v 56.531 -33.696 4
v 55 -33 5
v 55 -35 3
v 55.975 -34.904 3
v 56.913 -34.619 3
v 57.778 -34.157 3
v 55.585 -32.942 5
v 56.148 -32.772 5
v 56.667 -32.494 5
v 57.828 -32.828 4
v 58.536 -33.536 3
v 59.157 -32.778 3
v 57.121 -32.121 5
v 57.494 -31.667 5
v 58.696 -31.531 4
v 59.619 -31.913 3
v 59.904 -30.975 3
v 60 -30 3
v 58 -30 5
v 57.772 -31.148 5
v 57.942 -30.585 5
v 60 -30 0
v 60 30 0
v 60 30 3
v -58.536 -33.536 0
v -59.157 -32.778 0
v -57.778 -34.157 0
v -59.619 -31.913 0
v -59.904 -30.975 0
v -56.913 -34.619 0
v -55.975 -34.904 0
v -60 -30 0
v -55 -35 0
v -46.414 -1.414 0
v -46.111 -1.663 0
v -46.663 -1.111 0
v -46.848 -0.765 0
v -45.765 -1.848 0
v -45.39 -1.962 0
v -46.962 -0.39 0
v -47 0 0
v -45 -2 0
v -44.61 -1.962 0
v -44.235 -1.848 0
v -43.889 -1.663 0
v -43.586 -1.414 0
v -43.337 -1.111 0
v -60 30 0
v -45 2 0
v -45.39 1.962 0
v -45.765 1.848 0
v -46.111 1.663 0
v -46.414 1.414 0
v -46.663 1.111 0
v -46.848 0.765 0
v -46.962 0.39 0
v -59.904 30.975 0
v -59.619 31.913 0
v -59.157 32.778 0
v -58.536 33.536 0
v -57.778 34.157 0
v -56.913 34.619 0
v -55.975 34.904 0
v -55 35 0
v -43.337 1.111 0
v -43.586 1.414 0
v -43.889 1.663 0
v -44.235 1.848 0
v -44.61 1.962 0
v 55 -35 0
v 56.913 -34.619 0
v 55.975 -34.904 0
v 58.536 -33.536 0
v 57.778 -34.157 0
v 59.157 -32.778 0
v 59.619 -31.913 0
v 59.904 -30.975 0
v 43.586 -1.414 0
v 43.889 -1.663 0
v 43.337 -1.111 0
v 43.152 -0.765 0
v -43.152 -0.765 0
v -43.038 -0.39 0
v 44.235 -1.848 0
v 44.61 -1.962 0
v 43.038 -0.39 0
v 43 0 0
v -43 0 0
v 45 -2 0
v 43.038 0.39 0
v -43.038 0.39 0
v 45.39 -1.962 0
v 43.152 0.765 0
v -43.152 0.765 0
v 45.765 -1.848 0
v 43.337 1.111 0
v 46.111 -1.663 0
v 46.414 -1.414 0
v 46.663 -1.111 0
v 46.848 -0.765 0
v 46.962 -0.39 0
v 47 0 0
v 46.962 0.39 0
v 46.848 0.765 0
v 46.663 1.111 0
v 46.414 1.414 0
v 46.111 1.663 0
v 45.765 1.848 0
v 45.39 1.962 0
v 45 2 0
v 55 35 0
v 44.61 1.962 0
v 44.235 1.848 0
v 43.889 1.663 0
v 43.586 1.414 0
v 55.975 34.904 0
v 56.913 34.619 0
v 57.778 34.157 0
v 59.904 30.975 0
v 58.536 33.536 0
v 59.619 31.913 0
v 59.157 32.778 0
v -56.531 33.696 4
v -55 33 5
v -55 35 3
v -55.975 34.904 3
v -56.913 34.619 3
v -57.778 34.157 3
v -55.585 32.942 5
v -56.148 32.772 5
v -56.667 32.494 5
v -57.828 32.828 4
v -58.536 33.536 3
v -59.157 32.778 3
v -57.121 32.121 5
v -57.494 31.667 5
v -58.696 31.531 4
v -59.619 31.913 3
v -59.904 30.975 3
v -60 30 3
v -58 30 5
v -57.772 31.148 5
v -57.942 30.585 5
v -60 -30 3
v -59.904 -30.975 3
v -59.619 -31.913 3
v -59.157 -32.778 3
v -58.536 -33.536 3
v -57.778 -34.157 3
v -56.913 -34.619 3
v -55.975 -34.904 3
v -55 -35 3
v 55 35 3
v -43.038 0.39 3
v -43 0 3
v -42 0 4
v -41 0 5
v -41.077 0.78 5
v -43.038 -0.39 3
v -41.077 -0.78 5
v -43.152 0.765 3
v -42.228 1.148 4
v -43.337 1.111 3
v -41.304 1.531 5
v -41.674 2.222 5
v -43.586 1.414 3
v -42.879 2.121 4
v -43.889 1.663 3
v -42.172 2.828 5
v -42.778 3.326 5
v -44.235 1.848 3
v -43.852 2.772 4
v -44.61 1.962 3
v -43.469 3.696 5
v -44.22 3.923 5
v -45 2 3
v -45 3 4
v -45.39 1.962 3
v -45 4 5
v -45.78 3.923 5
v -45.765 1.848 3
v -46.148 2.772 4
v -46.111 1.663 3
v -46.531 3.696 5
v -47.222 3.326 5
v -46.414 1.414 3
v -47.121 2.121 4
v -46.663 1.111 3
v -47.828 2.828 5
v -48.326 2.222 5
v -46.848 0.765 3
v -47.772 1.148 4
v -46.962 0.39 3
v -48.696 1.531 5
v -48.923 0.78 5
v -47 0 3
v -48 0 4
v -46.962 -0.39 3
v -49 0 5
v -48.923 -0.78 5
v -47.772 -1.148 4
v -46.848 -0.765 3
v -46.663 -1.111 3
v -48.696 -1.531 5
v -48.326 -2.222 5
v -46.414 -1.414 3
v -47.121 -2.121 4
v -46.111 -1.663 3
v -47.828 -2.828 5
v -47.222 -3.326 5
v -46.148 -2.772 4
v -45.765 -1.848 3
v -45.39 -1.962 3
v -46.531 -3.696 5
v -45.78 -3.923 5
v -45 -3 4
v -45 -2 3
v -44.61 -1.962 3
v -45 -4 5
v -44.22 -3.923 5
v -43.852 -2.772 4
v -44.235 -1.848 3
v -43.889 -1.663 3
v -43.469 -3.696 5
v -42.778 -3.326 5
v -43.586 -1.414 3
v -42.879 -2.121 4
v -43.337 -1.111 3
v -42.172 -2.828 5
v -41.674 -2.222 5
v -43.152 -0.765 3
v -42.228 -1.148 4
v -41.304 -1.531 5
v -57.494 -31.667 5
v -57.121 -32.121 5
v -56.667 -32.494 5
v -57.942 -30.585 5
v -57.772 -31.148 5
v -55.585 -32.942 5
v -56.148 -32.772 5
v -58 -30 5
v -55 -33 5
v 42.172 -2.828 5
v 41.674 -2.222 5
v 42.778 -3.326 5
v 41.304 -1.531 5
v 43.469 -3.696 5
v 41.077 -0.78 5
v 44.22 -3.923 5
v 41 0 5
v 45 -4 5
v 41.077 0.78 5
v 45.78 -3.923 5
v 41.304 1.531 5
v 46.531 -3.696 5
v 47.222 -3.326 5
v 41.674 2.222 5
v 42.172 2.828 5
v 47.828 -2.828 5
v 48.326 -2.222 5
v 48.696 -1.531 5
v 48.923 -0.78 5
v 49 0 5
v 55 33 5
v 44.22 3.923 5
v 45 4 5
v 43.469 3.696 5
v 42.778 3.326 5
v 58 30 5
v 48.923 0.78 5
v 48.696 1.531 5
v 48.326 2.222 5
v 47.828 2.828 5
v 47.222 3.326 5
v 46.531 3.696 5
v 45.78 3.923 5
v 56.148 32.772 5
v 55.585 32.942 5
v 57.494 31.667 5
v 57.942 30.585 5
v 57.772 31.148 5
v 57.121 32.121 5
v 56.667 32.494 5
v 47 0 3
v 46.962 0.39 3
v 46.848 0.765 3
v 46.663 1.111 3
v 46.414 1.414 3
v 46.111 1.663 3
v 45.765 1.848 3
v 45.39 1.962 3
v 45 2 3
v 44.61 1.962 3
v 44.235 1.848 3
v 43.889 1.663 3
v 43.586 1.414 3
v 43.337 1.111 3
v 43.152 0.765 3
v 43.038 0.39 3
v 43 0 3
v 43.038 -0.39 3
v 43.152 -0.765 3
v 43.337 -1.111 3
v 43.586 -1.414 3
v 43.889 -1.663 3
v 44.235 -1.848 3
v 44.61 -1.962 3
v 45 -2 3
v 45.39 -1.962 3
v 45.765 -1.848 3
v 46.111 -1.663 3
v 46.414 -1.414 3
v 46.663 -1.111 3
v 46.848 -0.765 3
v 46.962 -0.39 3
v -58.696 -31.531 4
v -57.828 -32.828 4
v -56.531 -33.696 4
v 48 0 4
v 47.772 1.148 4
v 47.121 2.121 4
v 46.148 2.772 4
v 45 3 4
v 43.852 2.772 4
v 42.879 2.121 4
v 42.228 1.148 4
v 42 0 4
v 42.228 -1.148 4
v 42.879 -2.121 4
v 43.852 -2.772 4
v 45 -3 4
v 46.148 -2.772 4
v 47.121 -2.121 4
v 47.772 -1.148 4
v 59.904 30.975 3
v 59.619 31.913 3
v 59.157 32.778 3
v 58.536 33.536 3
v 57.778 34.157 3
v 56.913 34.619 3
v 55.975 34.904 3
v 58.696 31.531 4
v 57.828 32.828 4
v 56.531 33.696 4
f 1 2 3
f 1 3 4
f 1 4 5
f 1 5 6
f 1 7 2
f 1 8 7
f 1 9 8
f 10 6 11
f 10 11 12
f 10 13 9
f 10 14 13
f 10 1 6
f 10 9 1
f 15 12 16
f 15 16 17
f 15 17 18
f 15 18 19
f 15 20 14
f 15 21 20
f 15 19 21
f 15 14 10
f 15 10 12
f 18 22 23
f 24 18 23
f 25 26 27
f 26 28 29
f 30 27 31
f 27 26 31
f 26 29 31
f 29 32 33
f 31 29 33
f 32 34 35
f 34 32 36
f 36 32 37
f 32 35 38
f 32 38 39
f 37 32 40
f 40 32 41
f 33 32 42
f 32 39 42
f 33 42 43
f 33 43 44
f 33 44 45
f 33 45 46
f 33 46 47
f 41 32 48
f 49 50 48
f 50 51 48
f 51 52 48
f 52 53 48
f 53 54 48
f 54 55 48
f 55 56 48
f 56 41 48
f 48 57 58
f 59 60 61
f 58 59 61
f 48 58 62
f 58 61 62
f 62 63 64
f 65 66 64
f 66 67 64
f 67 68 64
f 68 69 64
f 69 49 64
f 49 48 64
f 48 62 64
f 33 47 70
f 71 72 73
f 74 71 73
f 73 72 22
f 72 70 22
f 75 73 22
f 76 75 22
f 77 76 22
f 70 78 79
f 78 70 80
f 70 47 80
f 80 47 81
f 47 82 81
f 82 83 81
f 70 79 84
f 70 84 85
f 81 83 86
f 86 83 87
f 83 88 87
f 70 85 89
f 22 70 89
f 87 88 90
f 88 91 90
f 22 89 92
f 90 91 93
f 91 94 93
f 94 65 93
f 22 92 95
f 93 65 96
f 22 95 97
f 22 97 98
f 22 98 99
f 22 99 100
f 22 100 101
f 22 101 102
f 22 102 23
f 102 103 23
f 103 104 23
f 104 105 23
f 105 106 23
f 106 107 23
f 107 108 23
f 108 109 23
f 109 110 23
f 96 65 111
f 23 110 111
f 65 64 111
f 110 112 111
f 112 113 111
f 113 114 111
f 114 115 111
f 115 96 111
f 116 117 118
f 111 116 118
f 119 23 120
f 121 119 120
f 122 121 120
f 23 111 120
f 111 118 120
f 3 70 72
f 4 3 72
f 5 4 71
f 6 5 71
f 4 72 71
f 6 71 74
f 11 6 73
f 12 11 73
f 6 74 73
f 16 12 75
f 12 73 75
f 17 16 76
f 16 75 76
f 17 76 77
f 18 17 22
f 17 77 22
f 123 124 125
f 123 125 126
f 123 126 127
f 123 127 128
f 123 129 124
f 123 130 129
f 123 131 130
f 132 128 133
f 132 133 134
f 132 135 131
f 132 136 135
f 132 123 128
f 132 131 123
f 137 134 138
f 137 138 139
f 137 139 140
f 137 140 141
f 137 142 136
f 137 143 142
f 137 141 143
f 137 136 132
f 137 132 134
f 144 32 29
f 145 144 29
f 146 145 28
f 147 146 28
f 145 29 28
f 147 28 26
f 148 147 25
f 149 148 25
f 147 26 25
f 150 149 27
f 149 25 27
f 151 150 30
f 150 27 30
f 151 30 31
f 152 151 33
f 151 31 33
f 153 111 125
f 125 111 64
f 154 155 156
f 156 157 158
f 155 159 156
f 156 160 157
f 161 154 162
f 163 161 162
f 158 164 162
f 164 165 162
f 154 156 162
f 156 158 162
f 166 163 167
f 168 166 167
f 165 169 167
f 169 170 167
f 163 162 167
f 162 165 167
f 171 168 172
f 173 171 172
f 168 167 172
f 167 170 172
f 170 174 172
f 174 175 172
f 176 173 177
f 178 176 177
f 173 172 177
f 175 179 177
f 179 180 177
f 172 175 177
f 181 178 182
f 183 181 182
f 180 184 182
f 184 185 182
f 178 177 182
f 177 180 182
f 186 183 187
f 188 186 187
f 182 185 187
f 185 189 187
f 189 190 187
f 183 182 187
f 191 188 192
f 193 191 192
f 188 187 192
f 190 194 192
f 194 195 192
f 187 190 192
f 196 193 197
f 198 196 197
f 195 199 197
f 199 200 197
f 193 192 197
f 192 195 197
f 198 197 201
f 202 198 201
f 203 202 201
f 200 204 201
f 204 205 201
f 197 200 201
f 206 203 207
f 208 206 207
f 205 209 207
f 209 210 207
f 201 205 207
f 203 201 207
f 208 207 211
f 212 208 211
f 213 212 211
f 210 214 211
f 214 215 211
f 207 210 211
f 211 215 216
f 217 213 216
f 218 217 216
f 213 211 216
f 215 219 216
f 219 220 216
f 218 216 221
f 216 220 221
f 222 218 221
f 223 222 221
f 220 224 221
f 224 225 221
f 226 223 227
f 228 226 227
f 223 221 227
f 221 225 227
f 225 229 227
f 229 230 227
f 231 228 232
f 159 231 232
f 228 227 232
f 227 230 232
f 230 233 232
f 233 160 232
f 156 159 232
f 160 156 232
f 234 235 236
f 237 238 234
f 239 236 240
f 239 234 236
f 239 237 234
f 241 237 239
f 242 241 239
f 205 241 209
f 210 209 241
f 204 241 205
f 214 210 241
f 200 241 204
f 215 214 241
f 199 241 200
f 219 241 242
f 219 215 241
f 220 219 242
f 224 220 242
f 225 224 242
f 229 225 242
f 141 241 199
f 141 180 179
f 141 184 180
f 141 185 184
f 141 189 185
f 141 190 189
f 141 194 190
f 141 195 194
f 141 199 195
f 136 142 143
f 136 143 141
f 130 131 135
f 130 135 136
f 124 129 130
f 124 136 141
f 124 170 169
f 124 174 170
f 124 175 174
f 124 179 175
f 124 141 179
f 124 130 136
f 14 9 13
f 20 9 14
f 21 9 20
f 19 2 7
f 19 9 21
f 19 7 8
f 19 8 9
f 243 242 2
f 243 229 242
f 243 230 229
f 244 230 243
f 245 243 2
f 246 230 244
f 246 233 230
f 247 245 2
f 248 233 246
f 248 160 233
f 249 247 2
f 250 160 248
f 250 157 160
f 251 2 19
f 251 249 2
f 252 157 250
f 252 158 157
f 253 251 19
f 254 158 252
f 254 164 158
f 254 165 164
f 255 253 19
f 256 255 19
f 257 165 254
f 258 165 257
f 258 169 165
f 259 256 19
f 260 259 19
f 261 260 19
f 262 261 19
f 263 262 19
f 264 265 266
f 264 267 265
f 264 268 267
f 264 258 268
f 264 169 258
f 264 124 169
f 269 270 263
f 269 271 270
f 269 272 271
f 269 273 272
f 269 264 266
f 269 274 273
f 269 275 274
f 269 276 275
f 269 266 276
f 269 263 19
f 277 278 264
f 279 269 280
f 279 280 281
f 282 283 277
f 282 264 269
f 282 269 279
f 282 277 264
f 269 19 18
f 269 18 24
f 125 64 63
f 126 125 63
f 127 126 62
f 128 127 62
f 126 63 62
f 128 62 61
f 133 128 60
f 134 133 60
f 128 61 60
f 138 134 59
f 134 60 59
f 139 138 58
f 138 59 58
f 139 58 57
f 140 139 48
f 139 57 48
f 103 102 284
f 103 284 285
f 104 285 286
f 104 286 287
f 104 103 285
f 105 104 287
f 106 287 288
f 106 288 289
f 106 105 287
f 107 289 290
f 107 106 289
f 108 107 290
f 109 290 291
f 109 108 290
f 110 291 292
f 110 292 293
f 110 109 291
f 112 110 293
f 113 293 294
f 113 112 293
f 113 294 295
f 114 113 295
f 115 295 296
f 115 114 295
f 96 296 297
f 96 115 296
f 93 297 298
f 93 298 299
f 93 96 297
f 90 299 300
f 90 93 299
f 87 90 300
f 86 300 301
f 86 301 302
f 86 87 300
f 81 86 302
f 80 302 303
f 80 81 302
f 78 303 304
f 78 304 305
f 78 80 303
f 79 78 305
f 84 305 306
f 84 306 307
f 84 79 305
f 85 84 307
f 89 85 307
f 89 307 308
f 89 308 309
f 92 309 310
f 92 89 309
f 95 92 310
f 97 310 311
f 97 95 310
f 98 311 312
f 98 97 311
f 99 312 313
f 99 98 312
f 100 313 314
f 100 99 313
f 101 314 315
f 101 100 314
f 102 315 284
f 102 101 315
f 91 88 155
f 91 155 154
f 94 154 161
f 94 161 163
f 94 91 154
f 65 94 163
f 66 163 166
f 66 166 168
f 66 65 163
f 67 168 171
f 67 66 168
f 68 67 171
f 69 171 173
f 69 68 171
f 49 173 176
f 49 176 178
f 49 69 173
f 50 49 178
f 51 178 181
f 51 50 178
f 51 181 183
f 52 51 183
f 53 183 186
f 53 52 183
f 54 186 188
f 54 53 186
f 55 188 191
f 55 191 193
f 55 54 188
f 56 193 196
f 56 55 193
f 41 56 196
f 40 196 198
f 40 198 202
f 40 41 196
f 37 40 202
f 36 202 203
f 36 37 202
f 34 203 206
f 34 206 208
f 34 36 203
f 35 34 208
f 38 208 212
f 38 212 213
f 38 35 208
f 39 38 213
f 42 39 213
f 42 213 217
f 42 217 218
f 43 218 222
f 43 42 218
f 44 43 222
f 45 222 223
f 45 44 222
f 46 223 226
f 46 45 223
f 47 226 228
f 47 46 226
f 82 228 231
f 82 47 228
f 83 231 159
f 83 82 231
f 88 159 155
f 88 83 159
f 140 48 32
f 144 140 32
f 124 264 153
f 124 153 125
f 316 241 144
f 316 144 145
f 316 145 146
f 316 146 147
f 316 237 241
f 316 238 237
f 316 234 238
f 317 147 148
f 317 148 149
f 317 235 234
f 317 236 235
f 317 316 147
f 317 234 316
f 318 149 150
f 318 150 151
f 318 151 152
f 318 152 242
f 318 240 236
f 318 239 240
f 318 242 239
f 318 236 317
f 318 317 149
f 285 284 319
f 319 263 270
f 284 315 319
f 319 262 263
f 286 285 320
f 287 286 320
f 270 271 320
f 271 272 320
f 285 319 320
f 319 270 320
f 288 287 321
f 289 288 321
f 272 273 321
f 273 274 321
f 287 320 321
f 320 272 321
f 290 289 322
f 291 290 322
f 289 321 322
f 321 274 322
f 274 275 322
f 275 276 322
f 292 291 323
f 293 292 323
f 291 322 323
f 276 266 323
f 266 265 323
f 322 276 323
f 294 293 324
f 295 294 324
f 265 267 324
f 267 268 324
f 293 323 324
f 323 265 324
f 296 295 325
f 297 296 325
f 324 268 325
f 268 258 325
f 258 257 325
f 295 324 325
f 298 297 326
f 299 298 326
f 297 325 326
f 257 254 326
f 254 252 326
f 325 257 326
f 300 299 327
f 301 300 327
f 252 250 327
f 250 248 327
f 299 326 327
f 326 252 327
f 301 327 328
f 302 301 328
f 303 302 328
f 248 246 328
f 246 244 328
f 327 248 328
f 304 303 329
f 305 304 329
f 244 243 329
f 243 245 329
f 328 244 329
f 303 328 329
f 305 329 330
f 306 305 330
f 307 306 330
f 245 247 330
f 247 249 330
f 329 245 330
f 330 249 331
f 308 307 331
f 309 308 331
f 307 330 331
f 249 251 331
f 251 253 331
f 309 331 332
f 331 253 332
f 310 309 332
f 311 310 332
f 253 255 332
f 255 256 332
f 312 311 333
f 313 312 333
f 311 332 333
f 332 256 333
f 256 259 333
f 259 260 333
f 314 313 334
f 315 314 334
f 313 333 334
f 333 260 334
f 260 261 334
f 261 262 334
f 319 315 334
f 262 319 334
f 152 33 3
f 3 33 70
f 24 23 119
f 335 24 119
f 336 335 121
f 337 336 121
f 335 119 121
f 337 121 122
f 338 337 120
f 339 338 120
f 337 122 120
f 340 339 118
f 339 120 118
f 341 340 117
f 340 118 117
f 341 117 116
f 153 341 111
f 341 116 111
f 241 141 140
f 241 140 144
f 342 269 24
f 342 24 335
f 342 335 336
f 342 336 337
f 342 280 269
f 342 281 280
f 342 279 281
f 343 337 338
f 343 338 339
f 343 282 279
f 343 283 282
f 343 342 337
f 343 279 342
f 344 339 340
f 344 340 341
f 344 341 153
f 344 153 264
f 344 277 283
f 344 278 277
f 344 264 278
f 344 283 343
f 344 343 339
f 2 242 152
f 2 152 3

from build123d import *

# Parameters (mm, degrees)
SKETCH_R     = 2
PAD_DEPTH    = 5
CHAMFER_SIZE = 2


with BuildPart() as part:
    # Sketch → Pad (new body)
    with BuildSketch(Plane.XY):
        with BuildLine():
            Line((-60, 30), (-60, -30))
            ThreePointArc((-60, -30), (-58.535534, -33.535534), (-55, -35))
            Line((-55, -35), (55, -35))
            ThreePointArc((55, -35), (58.535534, -33.535534), (60, -30))
            Line((60, -30), (60, 30))
            ThreePointArc((60, 30), (58.535534, 33.535534), (55, 35))
            Line((55, 35), (-55, 35))
            ThreePointArc((-55, 35), (-58.535534, 33.535534), (-60, 30))
        make_face()
        with Locations((-45, 0)):
            Circle(SKETCH_R, mode=Mode.SUBTRACT)
        with Locations((45, 0)):
            Circle(SKETCH_R, mode=Mode.SUBTRACT)
    extrude(amount=PAD_DEPTH)

    # Chamfer
    chamfer_edges = [part.edges().sort_by_distance(p)[0] for p in [
        (-60, 0, 5),
        (-58.535534, -33.535534, 5),
        (0, -35, 5),
        (58.535534, -33.535534, 5),
        (60, 0, 5),
        (58.535534, 33.535534, 5),
        (0, 35, 5),
        (-58.535534, 33.535534, 5),
        (43, 0, 5),
        (-47, 0, 5),
    ]]
    chamfer(chamfer_edges, length=CHAMFER_SIZE)


solid = part.part
